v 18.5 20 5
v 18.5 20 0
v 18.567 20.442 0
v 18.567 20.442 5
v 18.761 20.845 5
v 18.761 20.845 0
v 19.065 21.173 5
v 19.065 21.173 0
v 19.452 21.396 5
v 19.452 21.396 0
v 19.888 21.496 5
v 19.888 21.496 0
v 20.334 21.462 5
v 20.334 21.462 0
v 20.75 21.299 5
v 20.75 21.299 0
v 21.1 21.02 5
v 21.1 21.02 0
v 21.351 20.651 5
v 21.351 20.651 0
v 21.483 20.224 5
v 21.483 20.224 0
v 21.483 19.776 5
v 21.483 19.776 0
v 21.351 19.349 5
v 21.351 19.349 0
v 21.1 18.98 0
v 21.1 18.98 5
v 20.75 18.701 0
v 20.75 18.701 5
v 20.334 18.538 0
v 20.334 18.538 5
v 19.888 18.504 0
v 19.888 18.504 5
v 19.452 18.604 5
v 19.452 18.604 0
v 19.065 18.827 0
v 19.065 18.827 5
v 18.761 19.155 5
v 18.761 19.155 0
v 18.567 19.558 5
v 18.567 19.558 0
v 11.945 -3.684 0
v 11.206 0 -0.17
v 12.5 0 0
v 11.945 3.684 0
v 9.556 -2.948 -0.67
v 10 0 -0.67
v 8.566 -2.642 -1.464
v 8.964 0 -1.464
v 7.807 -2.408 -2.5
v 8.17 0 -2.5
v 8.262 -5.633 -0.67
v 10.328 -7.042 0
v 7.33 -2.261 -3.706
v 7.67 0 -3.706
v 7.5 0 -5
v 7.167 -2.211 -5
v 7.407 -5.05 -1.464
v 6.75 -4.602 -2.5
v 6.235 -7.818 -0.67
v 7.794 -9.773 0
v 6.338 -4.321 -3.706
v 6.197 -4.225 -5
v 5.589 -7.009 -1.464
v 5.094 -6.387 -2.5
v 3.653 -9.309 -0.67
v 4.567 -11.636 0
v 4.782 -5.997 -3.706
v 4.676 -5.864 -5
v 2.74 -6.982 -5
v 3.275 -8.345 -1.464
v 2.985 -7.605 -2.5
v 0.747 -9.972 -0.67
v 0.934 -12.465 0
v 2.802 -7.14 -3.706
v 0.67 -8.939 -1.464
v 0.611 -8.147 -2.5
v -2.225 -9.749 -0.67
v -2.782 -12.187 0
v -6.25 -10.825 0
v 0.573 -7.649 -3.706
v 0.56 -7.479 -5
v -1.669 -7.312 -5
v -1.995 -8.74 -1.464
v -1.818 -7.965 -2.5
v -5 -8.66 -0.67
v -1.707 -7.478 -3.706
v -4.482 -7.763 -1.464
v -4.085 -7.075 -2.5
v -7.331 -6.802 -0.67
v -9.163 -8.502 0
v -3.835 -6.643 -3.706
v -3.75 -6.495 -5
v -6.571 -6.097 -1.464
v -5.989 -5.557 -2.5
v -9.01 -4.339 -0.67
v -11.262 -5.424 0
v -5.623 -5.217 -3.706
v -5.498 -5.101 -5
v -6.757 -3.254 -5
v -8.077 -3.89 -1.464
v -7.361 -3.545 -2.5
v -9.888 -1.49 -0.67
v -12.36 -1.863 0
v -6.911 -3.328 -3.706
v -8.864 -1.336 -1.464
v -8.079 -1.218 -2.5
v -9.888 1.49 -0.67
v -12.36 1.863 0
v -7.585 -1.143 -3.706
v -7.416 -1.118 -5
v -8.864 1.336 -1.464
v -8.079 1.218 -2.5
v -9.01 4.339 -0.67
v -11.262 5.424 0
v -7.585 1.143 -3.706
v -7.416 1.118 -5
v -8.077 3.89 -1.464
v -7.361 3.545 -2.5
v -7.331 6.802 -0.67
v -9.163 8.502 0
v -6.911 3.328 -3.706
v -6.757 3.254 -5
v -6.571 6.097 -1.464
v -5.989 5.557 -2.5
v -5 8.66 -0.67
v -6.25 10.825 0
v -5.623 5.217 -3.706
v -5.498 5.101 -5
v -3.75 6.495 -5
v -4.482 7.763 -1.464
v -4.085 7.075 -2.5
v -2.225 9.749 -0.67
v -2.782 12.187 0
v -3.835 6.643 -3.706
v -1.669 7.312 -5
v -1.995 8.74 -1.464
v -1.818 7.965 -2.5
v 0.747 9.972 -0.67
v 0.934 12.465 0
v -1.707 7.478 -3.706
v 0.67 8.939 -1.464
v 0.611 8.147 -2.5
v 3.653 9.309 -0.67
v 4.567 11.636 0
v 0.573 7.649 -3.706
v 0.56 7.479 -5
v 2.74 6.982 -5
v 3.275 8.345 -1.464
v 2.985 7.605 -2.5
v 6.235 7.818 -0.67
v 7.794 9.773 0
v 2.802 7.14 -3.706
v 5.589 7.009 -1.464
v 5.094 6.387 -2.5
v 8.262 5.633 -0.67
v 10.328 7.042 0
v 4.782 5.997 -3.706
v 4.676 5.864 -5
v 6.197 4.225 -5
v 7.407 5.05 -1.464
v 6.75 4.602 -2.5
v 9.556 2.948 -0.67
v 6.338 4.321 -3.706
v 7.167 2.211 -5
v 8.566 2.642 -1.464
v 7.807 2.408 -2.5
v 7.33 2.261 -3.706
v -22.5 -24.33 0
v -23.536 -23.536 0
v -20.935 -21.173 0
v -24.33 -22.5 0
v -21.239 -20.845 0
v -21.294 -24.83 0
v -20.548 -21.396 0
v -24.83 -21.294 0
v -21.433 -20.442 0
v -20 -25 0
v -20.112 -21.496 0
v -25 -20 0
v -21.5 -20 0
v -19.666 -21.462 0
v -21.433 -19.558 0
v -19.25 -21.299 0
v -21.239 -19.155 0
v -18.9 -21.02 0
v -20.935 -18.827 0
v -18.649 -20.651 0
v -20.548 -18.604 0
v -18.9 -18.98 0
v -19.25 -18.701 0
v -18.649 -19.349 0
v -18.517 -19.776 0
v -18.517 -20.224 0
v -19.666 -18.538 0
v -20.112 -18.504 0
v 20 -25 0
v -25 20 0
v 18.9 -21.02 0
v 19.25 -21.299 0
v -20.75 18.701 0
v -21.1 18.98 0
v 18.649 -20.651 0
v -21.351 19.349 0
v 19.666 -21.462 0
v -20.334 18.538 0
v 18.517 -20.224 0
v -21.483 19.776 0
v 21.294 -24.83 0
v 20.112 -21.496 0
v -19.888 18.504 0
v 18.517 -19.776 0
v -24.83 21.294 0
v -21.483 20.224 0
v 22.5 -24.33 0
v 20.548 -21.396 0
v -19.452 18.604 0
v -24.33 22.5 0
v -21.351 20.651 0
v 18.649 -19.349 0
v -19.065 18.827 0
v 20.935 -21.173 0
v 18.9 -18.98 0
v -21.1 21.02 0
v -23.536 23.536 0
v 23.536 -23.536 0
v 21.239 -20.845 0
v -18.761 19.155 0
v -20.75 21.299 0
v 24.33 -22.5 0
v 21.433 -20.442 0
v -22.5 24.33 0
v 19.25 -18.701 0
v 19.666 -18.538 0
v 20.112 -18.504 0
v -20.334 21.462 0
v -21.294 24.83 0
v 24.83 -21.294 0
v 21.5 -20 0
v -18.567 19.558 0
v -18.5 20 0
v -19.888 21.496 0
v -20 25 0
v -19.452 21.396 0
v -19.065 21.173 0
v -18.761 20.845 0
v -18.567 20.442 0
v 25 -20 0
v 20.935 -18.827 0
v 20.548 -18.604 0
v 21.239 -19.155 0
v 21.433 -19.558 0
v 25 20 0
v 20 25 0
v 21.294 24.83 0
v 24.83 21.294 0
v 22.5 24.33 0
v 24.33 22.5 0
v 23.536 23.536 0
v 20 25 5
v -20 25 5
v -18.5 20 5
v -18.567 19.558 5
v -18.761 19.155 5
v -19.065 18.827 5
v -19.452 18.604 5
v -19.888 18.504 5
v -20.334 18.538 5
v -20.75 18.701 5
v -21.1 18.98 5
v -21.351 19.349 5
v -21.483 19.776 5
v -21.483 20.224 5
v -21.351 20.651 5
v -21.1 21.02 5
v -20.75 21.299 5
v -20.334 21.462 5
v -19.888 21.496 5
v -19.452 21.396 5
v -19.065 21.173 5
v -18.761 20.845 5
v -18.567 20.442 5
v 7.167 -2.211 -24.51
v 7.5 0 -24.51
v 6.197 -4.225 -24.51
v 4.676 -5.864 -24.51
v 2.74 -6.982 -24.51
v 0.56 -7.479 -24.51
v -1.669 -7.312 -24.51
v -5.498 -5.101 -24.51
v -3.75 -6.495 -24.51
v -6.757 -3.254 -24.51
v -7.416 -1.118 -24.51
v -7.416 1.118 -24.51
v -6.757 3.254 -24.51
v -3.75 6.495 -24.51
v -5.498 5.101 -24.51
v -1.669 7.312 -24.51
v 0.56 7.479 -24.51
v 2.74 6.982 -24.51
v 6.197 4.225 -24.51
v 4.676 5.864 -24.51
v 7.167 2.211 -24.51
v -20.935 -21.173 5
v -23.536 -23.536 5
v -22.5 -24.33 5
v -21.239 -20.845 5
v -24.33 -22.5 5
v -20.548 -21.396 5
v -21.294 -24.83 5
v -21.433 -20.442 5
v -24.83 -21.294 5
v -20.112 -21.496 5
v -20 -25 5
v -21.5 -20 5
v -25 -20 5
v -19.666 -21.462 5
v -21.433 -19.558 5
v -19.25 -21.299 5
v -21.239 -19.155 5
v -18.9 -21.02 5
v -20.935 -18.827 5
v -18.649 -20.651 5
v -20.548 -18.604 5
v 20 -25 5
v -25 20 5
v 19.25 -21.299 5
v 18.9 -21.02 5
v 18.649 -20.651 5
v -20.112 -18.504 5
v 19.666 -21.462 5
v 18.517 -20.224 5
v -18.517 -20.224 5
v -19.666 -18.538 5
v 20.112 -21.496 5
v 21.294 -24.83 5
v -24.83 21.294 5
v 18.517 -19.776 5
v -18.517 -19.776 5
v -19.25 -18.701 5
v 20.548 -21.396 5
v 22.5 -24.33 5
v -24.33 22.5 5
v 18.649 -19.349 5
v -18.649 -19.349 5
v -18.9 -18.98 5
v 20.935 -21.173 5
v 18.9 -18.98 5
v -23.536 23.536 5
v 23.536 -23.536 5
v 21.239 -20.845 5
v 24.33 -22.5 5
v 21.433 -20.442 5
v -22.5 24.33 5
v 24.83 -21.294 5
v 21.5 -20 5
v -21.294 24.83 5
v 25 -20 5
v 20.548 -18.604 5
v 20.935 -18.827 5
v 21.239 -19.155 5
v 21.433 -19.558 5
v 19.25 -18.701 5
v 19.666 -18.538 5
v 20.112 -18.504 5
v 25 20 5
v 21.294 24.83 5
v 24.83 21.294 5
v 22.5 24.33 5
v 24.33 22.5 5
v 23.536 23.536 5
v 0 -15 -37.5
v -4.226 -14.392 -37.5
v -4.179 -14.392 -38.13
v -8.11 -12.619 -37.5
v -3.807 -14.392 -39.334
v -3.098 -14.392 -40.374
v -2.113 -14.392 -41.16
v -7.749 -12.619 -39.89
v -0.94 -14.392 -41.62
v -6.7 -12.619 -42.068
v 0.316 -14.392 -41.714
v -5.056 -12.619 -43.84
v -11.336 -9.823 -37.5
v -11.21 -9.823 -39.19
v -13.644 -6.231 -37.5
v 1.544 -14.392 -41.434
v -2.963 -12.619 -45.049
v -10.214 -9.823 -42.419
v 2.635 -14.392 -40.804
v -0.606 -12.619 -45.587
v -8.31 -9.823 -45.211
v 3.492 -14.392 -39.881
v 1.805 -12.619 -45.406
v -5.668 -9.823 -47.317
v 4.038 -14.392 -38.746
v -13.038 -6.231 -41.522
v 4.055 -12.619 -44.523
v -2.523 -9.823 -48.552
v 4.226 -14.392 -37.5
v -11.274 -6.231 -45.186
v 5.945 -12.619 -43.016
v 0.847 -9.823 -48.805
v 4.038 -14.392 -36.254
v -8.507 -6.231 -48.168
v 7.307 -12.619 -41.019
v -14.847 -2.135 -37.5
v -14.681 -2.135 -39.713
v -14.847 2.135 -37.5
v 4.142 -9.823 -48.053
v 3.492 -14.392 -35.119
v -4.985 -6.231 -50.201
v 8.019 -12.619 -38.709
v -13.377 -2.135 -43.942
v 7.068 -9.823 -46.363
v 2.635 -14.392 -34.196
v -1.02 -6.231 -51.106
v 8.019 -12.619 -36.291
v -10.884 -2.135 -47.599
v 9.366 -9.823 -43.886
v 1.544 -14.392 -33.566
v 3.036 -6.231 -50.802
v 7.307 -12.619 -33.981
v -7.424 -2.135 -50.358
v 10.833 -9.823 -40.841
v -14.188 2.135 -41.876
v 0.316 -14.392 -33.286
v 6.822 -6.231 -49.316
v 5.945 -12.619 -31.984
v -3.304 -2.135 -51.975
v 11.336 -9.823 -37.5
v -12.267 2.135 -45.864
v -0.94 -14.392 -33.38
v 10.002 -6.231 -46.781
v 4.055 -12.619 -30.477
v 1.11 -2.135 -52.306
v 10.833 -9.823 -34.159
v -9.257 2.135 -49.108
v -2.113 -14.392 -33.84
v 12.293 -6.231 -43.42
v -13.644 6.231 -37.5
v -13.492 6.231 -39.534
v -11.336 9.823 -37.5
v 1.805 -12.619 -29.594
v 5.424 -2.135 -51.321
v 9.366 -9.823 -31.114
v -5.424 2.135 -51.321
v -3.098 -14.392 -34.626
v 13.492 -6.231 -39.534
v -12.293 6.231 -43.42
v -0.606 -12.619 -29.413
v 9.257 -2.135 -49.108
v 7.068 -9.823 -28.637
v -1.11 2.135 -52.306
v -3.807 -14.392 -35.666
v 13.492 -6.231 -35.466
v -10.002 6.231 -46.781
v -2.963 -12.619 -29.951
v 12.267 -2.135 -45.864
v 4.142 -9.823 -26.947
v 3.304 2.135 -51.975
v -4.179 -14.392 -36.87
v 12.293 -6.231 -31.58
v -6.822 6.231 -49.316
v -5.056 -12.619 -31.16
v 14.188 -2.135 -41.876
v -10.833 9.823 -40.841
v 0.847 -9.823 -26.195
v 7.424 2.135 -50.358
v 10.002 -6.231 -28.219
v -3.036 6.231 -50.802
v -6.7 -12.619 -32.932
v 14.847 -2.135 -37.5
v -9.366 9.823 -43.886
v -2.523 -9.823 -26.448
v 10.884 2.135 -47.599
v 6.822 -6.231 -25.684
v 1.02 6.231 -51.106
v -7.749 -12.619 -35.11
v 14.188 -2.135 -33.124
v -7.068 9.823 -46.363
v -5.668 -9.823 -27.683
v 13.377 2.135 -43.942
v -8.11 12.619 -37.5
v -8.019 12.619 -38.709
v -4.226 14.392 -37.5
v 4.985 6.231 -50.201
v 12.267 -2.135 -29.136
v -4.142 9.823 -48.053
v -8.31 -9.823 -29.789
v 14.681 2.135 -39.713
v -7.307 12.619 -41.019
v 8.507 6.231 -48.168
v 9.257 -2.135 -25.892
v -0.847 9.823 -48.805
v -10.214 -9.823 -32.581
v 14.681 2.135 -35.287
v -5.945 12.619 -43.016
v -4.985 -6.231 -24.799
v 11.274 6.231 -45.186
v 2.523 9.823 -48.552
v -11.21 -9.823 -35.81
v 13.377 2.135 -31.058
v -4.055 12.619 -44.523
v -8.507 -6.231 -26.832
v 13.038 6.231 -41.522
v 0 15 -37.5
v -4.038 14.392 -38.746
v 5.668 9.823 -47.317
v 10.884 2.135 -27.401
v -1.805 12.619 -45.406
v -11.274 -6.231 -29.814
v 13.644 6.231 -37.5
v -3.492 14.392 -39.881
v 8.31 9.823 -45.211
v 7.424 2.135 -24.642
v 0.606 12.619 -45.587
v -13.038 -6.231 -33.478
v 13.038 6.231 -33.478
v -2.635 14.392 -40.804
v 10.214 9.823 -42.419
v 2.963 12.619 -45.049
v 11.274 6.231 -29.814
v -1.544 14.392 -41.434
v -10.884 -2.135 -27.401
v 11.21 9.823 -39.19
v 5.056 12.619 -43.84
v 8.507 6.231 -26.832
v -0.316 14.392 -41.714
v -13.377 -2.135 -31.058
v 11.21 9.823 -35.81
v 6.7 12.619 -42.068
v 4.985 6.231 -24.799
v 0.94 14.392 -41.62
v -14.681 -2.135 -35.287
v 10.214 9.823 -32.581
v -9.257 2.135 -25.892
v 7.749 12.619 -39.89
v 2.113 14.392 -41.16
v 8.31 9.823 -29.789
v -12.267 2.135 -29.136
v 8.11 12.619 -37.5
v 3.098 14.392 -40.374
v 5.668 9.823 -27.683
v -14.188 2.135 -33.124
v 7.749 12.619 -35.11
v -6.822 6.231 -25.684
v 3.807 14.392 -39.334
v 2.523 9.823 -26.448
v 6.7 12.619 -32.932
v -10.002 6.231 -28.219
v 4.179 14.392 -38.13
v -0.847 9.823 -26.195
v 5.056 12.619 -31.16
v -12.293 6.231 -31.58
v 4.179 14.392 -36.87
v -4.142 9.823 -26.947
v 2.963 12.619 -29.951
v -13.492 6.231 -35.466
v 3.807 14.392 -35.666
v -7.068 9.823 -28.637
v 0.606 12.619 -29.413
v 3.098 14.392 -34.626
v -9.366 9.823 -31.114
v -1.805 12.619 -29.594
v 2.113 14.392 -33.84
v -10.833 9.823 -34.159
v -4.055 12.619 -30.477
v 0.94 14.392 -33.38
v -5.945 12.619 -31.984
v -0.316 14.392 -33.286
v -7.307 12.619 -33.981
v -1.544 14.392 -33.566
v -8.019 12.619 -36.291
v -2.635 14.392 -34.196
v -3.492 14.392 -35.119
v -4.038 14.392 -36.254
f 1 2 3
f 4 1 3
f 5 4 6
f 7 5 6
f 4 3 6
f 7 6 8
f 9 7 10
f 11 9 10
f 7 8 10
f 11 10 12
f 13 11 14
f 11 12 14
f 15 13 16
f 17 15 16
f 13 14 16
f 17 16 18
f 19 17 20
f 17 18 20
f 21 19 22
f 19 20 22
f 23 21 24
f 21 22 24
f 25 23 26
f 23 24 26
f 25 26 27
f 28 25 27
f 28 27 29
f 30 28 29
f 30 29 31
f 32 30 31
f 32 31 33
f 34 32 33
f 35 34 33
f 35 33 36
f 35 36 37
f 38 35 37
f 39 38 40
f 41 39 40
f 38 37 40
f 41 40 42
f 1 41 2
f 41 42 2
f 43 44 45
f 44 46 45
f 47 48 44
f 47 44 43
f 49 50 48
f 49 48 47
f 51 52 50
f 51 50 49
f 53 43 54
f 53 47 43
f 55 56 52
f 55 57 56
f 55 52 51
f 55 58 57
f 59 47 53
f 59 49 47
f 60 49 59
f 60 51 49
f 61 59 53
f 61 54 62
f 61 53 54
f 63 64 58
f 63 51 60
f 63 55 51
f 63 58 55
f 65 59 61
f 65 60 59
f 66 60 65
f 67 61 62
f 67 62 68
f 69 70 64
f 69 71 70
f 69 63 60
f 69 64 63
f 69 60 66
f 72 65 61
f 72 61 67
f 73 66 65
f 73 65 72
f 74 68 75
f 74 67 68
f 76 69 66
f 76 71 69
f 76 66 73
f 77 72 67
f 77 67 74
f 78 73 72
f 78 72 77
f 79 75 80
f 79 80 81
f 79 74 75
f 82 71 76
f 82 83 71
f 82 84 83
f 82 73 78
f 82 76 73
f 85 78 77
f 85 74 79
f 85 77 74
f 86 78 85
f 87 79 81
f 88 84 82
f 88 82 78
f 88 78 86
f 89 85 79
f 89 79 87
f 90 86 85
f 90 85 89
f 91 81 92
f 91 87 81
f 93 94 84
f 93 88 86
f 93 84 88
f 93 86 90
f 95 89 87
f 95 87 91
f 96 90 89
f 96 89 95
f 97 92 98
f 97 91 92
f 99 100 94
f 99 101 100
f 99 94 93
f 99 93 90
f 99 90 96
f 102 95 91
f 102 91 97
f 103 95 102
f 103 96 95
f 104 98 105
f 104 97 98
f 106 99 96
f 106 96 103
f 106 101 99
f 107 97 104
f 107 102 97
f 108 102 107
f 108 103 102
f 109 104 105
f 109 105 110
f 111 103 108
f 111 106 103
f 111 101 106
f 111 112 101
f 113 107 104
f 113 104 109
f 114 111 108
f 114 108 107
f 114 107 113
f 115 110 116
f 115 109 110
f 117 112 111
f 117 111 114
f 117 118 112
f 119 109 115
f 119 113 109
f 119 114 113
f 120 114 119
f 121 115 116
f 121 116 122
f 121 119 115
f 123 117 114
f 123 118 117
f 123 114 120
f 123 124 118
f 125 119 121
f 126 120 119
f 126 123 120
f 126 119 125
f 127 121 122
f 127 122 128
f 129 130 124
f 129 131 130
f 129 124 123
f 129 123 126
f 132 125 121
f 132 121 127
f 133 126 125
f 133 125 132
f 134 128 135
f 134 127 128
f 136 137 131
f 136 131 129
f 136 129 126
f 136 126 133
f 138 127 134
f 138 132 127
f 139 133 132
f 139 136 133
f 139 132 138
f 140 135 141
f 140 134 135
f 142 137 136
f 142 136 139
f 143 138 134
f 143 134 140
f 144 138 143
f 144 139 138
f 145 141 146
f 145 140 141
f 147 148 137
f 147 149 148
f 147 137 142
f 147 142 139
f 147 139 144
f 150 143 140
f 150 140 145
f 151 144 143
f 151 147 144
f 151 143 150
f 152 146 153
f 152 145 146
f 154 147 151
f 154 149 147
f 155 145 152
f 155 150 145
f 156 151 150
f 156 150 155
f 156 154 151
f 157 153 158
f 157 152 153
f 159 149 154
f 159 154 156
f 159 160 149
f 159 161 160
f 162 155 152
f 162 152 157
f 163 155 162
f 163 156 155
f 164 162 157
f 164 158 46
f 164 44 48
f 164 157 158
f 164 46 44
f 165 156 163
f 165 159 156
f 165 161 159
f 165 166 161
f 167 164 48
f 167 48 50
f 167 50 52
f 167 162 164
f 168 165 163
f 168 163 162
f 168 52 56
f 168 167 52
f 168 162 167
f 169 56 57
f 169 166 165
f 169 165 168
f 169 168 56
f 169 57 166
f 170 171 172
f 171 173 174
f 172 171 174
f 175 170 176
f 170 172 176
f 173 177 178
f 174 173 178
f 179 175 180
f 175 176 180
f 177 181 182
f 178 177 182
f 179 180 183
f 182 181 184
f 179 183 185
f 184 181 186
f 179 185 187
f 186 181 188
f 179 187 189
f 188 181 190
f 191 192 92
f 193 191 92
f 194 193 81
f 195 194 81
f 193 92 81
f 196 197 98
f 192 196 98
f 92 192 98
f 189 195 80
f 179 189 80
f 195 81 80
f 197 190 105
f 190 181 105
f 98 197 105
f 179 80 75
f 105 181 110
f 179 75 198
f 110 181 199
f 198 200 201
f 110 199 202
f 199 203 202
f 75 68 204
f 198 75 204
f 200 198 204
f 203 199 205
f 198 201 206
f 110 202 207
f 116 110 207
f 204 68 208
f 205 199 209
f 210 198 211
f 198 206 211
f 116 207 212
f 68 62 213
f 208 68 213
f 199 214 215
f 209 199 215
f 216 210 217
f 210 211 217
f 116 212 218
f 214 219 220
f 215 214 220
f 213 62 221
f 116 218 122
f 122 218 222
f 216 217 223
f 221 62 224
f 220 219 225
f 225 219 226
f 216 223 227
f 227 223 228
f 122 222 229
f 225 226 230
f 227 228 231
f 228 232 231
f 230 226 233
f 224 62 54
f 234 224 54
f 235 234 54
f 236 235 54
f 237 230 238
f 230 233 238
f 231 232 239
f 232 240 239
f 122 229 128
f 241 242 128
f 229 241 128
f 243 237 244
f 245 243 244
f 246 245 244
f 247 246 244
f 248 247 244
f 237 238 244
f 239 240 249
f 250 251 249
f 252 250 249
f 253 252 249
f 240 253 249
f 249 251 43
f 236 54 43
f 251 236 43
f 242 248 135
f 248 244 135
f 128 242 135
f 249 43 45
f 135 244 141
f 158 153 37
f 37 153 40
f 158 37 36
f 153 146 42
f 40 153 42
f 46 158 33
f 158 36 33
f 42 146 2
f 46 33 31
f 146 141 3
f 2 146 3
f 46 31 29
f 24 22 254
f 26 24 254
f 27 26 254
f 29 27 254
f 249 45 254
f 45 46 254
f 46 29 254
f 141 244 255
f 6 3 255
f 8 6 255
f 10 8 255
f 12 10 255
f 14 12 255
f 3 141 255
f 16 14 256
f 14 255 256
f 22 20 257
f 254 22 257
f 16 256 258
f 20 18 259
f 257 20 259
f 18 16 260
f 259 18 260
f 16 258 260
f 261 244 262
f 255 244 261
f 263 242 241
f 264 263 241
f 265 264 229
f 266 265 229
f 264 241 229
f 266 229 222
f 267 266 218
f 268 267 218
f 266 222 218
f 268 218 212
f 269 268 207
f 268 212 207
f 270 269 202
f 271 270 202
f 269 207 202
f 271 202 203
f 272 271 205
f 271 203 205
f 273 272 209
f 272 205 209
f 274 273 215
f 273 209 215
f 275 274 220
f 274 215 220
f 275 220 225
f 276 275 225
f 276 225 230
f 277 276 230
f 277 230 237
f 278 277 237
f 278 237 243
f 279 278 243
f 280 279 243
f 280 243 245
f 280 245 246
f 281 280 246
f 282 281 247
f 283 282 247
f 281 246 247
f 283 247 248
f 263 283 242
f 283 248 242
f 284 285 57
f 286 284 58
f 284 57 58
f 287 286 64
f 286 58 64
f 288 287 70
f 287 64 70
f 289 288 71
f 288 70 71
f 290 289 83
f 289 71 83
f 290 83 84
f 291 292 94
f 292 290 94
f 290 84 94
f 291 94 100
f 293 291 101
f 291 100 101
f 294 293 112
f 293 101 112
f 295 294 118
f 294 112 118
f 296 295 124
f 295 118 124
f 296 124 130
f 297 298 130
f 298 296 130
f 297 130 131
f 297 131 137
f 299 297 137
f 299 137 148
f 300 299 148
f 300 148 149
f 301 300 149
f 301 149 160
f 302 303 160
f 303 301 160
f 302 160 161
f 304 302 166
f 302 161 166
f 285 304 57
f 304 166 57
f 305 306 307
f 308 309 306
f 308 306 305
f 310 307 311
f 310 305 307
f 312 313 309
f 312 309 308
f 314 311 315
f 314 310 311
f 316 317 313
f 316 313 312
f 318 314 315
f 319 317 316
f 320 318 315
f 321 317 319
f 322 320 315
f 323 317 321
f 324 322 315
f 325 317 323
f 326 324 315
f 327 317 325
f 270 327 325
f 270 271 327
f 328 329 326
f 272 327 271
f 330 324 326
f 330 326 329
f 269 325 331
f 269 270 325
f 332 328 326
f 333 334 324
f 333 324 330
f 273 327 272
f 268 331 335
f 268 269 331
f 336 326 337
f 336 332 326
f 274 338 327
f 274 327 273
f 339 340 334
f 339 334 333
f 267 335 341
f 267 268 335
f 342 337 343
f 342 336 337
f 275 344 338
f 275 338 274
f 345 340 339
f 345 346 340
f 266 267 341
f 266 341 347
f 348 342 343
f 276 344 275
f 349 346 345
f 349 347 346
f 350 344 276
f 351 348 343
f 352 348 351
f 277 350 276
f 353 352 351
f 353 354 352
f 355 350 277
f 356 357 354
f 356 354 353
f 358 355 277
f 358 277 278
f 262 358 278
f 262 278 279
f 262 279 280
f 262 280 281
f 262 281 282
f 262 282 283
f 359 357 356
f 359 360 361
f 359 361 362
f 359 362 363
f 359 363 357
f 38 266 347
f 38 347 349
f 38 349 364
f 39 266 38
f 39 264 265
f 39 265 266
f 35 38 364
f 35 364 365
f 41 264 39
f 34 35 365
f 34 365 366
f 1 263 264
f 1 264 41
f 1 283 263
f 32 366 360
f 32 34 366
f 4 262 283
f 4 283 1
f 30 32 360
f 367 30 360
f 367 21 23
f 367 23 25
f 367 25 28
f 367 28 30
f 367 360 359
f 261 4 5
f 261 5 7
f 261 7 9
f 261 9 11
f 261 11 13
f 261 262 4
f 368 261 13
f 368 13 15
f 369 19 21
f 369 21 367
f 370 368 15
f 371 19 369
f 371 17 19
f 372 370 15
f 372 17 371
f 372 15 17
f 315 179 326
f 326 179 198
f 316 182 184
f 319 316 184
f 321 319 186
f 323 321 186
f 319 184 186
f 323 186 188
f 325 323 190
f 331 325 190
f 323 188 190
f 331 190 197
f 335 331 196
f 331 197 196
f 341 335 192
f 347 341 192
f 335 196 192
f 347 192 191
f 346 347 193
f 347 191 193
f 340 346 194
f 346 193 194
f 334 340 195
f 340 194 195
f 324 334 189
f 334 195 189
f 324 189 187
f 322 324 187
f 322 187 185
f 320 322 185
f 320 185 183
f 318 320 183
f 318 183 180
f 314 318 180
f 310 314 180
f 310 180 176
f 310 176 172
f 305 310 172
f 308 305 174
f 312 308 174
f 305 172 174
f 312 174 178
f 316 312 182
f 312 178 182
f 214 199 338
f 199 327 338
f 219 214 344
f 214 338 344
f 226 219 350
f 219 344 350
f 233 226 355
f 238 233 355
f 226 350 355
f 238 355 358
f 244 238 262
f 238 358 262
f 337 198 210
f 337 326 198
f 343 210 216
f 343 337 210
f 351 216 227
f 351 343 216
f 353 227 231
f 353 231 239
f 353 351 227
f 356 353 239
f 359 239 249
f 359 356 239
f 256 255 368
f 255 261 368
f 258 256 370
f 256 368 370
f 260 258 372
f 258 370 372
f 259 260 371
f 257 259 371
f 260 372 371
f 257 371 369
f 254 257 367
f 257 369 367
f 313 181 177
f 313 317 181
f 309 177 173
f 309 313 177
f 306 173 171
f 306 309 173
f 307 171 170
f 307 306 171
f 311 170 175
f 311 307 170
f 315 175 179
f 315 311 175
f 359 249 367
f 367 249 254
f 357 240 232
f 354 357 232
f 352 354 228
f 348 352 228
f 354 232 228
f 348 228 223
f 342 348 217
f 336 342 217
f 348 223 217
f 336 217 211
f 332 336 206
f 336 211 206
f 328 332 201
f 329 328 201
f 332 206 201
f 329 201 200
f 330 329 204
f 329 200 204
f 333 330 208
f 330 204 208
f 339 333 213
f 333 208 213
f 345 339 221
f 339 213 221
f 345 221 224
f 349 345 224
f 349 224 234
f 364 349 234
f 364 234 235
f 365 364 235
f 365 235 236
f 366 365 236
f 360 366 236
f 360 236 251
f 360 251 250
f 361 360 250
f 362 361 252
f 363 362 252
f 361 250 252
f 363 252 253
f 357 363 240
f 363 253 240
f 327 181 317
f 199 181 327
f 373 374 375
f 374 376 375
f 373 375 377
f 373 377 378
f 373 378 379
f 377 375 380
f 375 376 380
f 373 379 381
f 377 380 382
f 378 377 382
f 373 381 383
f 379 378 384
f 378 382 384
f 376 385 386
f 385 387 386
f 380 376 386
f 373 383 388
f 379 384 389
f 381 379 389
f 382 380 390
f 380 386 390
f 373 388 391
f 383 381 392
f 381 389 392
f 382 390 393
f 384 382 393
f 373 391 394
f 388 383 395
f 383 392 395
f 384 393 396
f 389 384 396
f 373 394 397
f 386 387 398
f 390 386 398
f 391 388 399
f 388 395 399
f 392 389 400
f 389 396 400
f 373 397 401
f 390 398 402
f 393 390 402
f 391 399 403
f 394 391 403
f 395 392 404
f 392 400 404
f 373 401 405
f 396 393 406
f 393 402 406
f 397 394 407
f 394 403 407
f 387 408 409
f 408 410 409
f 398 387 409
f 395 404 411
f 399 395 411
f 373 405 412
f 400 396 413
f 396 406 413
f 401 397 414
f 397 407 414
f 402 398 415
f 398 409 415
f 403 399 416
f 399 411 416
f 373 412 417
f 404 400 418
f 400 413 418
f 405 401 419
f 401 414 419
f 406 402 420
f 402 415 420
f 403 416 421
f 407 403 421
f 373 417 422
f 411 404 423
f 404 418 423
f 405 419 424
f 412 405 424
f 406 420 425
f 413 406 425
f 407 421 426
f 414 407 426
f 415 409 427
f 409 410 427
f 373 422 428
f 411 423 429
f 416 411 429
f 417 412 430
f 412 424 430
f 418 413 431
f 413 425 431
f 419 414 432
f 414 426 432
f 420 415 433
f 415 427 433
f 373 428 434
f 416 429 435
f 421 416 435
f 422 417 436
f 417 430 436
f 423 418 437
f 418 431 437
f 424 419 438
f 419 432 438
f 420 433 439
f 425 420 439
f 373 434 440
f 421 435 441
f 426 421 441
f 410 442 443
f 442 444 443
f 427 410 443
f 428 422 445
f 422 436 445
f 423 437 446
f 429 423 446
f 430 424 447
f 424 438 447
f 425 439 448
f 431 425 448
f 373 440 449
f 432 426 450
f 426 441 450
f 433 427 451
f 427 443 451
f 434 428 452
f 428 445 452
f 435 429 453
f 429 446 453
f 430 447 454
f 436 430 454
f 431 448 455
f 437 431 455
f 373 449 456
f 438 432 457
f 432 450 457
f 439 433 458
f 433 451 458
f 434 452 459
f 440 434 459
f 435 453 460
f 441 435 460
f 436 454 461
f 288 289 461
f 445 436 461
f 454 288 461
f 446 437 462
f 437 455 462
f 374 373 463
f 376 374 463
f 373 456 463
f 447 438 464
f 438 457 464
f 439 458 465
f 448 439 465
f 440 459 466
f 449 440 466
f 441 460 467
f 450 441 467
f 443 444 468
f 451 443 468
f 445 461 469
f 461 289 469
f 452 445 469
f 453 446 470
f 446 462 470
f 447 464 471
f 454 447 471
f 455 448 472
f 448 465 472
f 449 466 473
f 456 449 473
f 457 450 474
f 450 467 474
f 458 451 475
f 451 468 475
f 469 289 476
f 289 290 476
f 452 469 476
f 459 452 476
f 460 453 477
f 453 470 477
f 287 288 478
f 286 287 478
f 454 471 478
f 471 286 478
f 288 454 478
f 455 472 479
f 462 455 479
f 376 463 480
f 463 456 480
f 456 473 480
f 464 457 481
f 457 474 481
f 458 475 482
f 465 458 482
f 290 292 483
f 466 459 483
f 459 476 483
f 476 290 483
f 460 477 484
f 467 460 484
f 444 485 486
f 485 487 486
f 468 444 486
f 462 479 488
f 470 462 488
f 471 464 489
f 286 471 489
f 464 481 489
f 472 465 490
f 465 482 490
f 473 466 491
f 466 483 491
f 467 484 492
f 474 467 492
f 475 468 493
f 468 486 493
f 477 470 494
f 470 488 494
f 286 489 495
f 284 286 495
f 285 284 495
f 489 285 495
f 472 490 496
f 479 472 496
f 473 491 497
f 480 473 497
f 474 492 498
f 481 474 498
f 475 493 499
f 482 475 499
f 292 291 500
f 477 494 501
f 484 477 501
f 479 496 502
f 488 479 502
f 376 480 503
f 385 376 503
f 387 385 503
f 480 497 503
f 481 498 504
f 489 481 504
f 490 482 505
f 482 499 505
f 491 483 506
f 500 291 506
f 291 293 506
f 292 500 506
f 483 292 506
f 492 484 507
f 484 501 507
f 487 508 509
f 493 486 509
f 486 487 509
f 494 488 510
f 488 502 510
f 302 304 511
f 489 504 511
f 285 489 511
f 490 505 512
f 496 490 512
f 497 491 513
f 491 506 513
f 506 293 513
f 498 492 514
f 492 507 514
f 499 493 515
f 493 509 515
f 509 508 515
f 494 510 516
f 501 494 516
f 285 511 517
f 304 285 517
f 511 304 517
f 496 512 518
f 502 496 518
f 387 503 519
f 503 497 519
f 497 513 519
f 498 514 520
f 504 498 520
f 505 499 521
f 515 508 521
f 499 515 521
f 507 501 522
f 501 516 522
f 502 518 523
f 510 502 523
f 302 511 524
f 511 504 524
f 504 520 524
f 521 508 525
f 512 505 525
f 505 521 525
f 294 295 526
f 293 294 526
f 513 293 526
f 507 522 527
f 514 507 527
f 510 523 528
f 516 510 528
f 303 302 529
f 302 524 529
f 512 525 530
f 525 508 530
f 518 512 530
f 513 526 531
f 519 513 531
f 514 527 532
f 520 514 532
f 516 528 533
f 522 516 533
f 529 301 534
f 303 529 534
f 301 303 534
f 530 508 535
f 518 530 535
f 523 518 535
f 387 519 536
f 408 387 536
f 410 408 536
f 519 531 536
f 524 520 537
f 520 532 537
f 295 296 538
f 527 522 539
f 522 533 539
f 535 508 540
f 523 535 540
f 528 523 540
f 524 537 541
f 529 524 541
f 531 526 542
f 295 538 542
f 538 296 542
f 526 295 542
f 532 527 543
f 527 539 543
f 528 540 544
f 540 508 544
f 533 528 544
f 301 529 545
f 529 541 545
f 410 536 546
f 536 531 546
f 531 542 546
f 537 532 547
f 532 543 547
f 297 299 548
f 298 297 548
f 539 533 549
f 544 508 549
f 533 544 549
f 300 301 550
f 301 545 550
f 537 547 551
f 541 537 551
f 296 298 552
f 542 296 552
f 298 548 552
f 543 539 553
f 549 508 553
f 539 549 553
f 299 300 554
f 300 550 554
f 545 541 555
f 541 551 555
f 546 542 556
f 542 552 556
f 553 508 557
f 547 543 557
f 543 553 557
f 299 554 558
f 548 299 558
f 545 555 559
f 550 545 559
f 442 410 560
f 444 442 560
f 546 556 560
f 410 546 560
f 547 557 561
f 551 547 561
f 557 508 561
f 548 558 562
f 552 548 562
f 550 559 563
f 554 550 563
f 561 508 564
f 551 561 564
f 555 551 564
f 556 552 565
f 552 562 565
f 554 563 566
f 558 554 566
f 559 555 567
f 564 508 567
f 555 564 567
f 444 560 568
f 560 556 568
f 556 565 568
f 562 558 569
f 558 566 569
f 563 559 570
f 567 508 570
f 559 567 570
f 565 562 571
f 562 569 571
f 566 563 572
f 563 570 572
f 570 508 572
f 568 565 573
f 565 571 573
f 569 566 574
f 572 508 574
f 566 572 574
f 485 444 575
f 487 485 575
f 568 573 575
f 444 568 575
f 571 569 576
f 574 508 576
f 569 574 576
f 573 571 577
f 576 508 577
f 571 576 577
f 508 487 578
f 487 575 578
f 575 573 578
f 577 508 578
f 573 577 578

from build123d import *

# Parameters (mm, degrees)
CROQUIS1_W                   = 50
CROQUIS1_H                   = 50
SALIENTE_EXTRUIR1_DEPTH      = 5
SALIENTE_EXTRUIR2_REACH      = 65.295
SALIENTE_EXTRUIR2_END_RADIUS = 15
CROQUIS2_R                   = 7.5
CROQUIS4_R                   = 1.5
CORTAR_EXTRUIR1_DEPTH        = 5
REDONDEO1_R                  = 5
REDONDEO2_R                  = 5


with BuildPart() as part:
    # Croquis1 → Saliente-Extruir1 (new body)
    with BuildSketch(Plane.XY):
        Rectangle(CROQUIS1_W, CROQUIS1_H)
    extrude(amount=SALIENTE_EXTRUIR1_DEPTH)



with BuildPart() as body_2:
    # Croquis3 → Revolución1 (revolve)
    with BuildSketch(Plane(origin=(0, 0, -37.5), x_dir=(-1, 0, 0), z_dir=(0, 0, -1))):
        with BuildLine():
            Line((0, 15), (0, -15))
            ThreePointArc((0, -15), (15, 0), (0, 15))
        make_face()
    revolve(axis=Axis((0, 15, -37.5), (0, -1, 0)))


with BuildPart() as part_1:
    add(part.part)

    add(body_2.part)  # Saliente-Extruir2 merges body 2
    # Saliente-Extruir2: up to this sphere (the profile starts outside it)
    saliente_extruir2_end = Location((0, 0, -37.5)) * Sphere(SALIENTE_EXTRUIR2_END_RADIUS, mode=Mode.PRIVATE)
    # Croquis2 → Saliente-Extruir2 (add, up to the surface)
    with BuildSketch(Plane(origin=(0, 0, 0), x_dir=(-1, 0, 0), z_dir=(0, 0, -1)), mode=Mode.PRIVATE) as saliente_extruir2_sk1:
        with Locations(Location((0, 0, 0), (0, 0, 180))):
            Circle(CROQUIS2_R)
    saliente_extruir2_tool1 = extrude(saliente_extruir2_sk1.sketch, amount=SALIENTE_EXTRUIR2_REACH, mode=Mode.PRIVATE) - saliente_extruir2_end
    add(saliente_extruir2_tool1.solids().sort_by_distance((0, 0, 0))[0])

    # Croquis4 → Cortar-Extruir1 (cut)
    with BuildSketch(Plane(origin=(0, 0, 0), x_dir=(-1, 0, 0), z_dir=(0, 0, -1))):
        with Locations((-20, 20)):
            Circle(CROQUIS4_R)
        with Locations(Location((20, 20, 0), (0, 0, 180))):
            Circle(CROQUIS4_R)
        with Locations((20, -20)):
            Circle(CROQUIS4_R)
        with Locations(Location((-20, -20, 0), (0, 0, 180))):
            Circle(CROQUIS4_R)
    extrude(amount=-CORTAR_EXTRUIR1_DEPTH, mode=Mode.SUBTRACT)

    # Redondeo1
    redondeo1_edges = [part_1.edges().sort_by_distance(p)[0] for p in [
        (25, -25, 2.5),
        (-25, -25, 2.5),
        (-25, 25, 2.5),
        (25, 25, 2.5),
    ]]
    fillet(redondeo1_edges, radius=REDONDEO1_R)

    # Redondeo2
    redondeo2_edges = [part_1.edges().sort_by_distance(p)[0] for p in [
        (-7.5, 0, 0),
    ]]
    fillet(redondeo2_edges, radius=REDONDEO2_R)


solid = part_1.part
